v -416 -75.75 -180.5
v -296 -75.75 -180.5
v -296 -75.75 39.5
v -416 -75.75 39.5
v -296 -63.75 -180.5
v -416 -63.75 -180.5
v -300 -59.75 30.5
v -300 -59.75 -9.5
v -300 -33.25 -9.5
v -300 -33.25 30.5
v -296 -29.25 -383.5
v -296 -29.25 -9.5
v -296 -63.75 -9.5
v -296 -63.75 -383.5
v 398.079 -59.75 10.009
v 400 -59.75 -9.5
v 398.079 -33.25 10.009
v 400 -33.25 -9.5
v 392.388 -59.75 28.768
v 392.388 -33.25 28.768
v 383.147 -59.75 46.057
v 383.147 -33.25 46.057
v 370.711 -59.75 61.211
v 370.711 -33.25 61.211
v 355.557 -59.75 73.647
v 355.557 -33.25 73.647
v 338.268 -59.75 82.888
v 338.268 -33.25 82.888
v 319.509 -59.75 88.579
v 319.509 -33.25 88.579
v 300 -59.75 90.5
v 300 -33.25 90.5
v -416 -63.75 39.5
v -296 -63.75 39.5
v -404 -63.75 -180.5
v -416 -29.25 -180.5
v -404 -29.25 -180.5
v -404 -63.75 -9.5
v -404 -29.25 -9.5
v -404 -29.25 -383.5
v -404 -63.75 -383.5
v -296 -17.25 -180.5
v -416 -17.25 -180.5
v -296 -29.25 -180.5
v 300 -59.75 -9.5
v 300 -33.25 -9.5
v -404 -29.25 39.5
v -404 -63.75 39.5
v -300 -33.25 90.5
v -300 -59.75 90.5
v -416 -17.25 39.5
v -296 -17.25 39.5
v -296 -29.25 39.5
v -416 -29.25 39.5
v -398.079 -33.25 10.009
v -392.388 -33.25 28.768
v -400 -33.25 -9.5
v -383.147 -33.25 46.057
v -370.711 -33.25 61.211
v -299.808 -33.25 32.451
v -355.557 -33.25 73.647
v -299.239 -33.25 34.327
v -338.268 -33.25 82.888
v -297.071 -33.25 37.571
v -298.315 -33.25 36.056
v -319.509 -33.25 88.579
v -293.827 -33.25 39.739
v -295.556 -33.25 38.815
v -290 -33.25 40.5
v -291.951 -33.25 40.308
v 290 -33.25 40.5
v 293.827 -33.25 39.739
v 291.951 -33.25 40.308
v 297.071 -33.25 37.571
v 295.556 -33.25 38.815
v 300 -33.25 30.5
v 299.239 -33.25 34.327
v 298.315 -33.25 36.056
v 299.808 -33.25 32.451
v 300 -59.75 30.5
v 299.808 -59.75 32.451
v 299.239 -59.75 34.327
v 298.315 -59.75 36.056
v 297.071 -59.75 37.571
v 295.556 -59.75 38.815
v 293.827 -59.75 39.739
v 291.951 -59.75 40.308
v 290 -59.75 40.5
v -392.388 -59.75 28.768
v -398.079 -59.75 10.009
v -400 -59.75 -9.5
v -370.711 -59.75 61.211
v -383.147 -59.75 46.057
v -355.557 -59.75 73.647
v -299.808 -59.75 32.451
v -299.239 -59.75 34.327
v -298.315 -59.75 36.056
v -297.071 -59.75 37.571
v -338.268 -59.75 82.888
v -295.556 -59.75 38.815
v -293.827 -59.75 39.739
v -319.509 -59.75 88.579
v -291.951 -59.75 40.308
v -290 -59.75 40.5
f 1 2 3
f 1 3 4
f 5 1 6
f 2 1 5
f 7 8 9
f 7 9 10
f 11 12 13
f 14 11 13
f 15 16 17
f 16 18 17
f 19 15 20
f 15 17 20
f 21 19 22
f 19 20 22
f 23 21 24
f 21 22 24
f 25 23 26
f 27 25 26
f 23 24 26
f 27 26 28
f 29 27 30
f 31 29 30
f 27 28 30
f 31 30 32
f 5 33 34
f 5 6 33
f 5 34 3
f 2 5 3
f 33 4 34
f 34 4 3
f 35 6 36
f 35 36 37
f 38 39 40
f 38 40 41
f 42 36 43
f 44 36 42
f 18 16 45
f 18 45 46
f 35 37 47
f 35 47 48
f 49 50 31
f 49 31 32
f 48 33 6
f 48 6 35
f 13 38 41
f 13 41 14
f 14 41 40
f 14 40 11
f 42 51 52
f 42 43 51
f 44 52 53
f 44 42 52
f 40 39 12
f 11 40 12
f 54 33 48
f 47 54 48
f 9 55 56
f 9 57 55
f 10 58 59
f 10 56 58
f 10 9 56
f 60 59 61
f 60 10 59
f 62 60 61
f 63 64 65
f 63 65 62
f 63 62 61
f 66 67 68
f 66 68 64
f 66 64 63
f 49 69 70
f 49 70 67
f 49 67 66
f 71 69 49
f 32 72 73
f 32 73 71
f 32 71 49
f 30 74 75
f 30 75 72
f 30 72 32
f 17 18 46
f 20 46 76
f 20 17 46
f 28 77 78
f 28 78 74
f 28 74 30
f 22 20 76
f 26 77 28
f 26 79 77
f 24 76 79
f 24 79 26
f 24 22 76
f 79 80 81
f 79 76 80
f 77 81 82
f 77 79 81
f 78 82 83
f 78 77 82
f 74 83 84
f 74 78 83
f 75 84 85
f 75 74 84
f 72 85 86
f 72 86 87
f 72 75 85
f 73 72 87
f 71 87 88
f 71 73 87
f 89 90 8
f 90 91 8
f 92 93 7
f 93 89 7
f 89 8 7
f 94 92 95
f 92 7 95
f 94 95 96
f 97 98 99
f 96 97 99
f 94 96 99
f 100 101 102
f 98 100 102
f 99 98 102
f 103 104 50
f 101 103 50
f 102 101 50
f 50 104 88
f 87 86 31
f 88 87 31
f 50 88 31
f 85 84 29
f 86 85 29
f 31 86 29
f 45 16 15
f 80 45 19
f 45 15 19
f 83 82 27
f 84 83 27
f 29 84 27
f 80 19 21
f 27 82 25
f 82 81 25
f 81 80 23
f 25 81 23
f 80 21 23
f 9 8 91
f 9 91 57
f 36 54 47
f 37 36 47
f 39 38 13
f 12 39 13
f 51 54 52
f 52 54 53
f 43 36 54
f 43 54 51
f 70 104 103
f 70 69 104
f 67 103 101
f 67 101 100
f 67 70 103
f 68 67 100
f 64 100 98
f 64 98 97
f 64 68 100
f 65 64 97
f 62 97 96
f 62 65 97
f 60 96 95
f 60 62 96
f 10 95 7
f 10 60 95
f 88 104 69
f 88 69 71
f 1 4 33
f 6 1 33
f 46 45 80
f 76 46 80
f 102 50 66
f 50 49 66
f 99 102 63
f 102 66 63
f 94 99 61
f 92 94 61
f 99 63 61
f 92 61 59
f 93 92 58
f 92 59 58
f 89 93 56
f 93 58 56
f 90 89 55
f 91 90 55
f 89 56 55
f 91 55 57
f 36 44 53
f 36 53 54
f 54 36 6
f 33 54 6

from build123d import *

# Parameters (mm, degrees)
F0_W          = 26.5
F0_H          = 100
F1_DEPTH      = 400
F1_DEPTH_BACK = 400
F2_W          = 600
F2_H          = 50
F3_DEPTH      = 26.501
F4_R          = 99.99999
F5_R          = 10
F6_W          = 108
F6_H          = 34.5
F6_W_2        = 100
F6_H_2        = 26.5
F7_DEPTH      = 374
F8_DEPTH      = 171
F8_DEPTH_BACK = 49
F6_W_3        = 12
F9_DEPTH      = 171
F9_DEPTH_BACK = 49


# Not quite as in the source:
# - a fillet or chamfer is up to 0.001 mm smaller than in the source, because OpenCascade refuses the exact size


with BuildPart() as f1:
    # F0 (on Right) → F1 (new body, two sides)
    with BuildSketch(Plane.YZ) as f1_sk:
        with Locations((-46.5, 40.5)):
            Rectangle(F0_W, F0_H)
    extrude(amount=F1_DEPTH)
    extrude(f1_sk.sketch, amount=-F1_DEPTH_BACK)

    # F2 (on face) → F3 (cut, through all)
    with BuildSketch(Plane.XZ.offset(59.75)):
        with Locations((0, 15.5)):
            Rectangle(F2_W, F2_H)
    extrude(amount=-F3_DEPTH, mode=Mode.SUBTRACT)

    # F4 (radius 100 in the source; OpenCascade refuses exactly that, so slightly less here)
    f4_edges = [f1.edges().sort_by_distance(p)[0] for p in [
        (-400, -46.5, 90.5),
        (400, -46.5, 90.5),
    ]]
    fillet(f4_edges, radius=F4_R)

    # F5
    f5_edges = [f1.edges().sort_by_distance(p)[0] for p in [
        (-300, -46.5, 40.5),
        (300, -46.5, 40.5),
    ]]
    fillet(f5_edges, radius=F5_R)


with BuildPart() as f7:
    # F6 (on face) → F7 (new body)
    with BuildSketch(Plane(origin=(0, 0, -9.5), x_dir=(1, 0, 0), z_dir=(0, 0, -1))):
        with Locations((-350, 46.5)):
            Rectangle(F6_W, F6_H)
        with Locations((-350, 46.5)):
            Rectangle(F6_W_2, F6_H_2, mode=Mode.SUBTRACT)
        with Locations((-350, 46.5)):
            Rectangle(F6_W_2, F6_H_2)
    extrude(amount=F7_DEPTH)


with BuildPart() as f8:
    # F6 (on face) → F8 (new body, two sides)
    with BuildSketch(Plane(origin=(0, 0, -9.5), x_dir=(1, 0, 0), z_dir=(0, 0, -1))) as f8_sk:
        Polygon((-404, 63.75), (-296, 63.75), (-296, 75.75), (-416, 75.75), (-416, 63.75), align=None)
    extrude(amount=F8_DEPTH)
    extrude(f8_sk.sketch, amount=-F8_DEPTH_BACK)


with BuildPart() as f8b:
    # F6 (on face) → F8, piece 2 (new body, two sides)
    with BuildSketch(Plane(origin=(0, 0, -9.5), x_dir=(1, 0, 0), z_dir=(0, 0, -1))) as f8_2_sk:
        Polygon((-296, 17.25), (-296, 29.25), (-404, 29.25), (-416, 29.25), (-416, 17.25), align=None)
    extrude(amount=F8_DEPTH)
    extrude(f8_2_sk.sketch, amount=-F8_DEPTH_BACK)


with BuildPart() as f9:
    # F6 (on face) → F9 (new body, two sides)
    with BuildSketch(Plane(origin=(0, 0, -9.5), x_dir=(1, 0, 0), z_dir=(0, 0, -1))) as f9_sk:
        with Locations((-410, 46.5)):
            Rectangle(F6_W_3, F6_H)
    extrude(amount=F9_DEPTH)
    extrude(f9_sk.sketch, amount=-F9_DEPTH_BACK)


solid = Compound([f1.part, f7.part, f8.part, f8b.part, f9.part])
